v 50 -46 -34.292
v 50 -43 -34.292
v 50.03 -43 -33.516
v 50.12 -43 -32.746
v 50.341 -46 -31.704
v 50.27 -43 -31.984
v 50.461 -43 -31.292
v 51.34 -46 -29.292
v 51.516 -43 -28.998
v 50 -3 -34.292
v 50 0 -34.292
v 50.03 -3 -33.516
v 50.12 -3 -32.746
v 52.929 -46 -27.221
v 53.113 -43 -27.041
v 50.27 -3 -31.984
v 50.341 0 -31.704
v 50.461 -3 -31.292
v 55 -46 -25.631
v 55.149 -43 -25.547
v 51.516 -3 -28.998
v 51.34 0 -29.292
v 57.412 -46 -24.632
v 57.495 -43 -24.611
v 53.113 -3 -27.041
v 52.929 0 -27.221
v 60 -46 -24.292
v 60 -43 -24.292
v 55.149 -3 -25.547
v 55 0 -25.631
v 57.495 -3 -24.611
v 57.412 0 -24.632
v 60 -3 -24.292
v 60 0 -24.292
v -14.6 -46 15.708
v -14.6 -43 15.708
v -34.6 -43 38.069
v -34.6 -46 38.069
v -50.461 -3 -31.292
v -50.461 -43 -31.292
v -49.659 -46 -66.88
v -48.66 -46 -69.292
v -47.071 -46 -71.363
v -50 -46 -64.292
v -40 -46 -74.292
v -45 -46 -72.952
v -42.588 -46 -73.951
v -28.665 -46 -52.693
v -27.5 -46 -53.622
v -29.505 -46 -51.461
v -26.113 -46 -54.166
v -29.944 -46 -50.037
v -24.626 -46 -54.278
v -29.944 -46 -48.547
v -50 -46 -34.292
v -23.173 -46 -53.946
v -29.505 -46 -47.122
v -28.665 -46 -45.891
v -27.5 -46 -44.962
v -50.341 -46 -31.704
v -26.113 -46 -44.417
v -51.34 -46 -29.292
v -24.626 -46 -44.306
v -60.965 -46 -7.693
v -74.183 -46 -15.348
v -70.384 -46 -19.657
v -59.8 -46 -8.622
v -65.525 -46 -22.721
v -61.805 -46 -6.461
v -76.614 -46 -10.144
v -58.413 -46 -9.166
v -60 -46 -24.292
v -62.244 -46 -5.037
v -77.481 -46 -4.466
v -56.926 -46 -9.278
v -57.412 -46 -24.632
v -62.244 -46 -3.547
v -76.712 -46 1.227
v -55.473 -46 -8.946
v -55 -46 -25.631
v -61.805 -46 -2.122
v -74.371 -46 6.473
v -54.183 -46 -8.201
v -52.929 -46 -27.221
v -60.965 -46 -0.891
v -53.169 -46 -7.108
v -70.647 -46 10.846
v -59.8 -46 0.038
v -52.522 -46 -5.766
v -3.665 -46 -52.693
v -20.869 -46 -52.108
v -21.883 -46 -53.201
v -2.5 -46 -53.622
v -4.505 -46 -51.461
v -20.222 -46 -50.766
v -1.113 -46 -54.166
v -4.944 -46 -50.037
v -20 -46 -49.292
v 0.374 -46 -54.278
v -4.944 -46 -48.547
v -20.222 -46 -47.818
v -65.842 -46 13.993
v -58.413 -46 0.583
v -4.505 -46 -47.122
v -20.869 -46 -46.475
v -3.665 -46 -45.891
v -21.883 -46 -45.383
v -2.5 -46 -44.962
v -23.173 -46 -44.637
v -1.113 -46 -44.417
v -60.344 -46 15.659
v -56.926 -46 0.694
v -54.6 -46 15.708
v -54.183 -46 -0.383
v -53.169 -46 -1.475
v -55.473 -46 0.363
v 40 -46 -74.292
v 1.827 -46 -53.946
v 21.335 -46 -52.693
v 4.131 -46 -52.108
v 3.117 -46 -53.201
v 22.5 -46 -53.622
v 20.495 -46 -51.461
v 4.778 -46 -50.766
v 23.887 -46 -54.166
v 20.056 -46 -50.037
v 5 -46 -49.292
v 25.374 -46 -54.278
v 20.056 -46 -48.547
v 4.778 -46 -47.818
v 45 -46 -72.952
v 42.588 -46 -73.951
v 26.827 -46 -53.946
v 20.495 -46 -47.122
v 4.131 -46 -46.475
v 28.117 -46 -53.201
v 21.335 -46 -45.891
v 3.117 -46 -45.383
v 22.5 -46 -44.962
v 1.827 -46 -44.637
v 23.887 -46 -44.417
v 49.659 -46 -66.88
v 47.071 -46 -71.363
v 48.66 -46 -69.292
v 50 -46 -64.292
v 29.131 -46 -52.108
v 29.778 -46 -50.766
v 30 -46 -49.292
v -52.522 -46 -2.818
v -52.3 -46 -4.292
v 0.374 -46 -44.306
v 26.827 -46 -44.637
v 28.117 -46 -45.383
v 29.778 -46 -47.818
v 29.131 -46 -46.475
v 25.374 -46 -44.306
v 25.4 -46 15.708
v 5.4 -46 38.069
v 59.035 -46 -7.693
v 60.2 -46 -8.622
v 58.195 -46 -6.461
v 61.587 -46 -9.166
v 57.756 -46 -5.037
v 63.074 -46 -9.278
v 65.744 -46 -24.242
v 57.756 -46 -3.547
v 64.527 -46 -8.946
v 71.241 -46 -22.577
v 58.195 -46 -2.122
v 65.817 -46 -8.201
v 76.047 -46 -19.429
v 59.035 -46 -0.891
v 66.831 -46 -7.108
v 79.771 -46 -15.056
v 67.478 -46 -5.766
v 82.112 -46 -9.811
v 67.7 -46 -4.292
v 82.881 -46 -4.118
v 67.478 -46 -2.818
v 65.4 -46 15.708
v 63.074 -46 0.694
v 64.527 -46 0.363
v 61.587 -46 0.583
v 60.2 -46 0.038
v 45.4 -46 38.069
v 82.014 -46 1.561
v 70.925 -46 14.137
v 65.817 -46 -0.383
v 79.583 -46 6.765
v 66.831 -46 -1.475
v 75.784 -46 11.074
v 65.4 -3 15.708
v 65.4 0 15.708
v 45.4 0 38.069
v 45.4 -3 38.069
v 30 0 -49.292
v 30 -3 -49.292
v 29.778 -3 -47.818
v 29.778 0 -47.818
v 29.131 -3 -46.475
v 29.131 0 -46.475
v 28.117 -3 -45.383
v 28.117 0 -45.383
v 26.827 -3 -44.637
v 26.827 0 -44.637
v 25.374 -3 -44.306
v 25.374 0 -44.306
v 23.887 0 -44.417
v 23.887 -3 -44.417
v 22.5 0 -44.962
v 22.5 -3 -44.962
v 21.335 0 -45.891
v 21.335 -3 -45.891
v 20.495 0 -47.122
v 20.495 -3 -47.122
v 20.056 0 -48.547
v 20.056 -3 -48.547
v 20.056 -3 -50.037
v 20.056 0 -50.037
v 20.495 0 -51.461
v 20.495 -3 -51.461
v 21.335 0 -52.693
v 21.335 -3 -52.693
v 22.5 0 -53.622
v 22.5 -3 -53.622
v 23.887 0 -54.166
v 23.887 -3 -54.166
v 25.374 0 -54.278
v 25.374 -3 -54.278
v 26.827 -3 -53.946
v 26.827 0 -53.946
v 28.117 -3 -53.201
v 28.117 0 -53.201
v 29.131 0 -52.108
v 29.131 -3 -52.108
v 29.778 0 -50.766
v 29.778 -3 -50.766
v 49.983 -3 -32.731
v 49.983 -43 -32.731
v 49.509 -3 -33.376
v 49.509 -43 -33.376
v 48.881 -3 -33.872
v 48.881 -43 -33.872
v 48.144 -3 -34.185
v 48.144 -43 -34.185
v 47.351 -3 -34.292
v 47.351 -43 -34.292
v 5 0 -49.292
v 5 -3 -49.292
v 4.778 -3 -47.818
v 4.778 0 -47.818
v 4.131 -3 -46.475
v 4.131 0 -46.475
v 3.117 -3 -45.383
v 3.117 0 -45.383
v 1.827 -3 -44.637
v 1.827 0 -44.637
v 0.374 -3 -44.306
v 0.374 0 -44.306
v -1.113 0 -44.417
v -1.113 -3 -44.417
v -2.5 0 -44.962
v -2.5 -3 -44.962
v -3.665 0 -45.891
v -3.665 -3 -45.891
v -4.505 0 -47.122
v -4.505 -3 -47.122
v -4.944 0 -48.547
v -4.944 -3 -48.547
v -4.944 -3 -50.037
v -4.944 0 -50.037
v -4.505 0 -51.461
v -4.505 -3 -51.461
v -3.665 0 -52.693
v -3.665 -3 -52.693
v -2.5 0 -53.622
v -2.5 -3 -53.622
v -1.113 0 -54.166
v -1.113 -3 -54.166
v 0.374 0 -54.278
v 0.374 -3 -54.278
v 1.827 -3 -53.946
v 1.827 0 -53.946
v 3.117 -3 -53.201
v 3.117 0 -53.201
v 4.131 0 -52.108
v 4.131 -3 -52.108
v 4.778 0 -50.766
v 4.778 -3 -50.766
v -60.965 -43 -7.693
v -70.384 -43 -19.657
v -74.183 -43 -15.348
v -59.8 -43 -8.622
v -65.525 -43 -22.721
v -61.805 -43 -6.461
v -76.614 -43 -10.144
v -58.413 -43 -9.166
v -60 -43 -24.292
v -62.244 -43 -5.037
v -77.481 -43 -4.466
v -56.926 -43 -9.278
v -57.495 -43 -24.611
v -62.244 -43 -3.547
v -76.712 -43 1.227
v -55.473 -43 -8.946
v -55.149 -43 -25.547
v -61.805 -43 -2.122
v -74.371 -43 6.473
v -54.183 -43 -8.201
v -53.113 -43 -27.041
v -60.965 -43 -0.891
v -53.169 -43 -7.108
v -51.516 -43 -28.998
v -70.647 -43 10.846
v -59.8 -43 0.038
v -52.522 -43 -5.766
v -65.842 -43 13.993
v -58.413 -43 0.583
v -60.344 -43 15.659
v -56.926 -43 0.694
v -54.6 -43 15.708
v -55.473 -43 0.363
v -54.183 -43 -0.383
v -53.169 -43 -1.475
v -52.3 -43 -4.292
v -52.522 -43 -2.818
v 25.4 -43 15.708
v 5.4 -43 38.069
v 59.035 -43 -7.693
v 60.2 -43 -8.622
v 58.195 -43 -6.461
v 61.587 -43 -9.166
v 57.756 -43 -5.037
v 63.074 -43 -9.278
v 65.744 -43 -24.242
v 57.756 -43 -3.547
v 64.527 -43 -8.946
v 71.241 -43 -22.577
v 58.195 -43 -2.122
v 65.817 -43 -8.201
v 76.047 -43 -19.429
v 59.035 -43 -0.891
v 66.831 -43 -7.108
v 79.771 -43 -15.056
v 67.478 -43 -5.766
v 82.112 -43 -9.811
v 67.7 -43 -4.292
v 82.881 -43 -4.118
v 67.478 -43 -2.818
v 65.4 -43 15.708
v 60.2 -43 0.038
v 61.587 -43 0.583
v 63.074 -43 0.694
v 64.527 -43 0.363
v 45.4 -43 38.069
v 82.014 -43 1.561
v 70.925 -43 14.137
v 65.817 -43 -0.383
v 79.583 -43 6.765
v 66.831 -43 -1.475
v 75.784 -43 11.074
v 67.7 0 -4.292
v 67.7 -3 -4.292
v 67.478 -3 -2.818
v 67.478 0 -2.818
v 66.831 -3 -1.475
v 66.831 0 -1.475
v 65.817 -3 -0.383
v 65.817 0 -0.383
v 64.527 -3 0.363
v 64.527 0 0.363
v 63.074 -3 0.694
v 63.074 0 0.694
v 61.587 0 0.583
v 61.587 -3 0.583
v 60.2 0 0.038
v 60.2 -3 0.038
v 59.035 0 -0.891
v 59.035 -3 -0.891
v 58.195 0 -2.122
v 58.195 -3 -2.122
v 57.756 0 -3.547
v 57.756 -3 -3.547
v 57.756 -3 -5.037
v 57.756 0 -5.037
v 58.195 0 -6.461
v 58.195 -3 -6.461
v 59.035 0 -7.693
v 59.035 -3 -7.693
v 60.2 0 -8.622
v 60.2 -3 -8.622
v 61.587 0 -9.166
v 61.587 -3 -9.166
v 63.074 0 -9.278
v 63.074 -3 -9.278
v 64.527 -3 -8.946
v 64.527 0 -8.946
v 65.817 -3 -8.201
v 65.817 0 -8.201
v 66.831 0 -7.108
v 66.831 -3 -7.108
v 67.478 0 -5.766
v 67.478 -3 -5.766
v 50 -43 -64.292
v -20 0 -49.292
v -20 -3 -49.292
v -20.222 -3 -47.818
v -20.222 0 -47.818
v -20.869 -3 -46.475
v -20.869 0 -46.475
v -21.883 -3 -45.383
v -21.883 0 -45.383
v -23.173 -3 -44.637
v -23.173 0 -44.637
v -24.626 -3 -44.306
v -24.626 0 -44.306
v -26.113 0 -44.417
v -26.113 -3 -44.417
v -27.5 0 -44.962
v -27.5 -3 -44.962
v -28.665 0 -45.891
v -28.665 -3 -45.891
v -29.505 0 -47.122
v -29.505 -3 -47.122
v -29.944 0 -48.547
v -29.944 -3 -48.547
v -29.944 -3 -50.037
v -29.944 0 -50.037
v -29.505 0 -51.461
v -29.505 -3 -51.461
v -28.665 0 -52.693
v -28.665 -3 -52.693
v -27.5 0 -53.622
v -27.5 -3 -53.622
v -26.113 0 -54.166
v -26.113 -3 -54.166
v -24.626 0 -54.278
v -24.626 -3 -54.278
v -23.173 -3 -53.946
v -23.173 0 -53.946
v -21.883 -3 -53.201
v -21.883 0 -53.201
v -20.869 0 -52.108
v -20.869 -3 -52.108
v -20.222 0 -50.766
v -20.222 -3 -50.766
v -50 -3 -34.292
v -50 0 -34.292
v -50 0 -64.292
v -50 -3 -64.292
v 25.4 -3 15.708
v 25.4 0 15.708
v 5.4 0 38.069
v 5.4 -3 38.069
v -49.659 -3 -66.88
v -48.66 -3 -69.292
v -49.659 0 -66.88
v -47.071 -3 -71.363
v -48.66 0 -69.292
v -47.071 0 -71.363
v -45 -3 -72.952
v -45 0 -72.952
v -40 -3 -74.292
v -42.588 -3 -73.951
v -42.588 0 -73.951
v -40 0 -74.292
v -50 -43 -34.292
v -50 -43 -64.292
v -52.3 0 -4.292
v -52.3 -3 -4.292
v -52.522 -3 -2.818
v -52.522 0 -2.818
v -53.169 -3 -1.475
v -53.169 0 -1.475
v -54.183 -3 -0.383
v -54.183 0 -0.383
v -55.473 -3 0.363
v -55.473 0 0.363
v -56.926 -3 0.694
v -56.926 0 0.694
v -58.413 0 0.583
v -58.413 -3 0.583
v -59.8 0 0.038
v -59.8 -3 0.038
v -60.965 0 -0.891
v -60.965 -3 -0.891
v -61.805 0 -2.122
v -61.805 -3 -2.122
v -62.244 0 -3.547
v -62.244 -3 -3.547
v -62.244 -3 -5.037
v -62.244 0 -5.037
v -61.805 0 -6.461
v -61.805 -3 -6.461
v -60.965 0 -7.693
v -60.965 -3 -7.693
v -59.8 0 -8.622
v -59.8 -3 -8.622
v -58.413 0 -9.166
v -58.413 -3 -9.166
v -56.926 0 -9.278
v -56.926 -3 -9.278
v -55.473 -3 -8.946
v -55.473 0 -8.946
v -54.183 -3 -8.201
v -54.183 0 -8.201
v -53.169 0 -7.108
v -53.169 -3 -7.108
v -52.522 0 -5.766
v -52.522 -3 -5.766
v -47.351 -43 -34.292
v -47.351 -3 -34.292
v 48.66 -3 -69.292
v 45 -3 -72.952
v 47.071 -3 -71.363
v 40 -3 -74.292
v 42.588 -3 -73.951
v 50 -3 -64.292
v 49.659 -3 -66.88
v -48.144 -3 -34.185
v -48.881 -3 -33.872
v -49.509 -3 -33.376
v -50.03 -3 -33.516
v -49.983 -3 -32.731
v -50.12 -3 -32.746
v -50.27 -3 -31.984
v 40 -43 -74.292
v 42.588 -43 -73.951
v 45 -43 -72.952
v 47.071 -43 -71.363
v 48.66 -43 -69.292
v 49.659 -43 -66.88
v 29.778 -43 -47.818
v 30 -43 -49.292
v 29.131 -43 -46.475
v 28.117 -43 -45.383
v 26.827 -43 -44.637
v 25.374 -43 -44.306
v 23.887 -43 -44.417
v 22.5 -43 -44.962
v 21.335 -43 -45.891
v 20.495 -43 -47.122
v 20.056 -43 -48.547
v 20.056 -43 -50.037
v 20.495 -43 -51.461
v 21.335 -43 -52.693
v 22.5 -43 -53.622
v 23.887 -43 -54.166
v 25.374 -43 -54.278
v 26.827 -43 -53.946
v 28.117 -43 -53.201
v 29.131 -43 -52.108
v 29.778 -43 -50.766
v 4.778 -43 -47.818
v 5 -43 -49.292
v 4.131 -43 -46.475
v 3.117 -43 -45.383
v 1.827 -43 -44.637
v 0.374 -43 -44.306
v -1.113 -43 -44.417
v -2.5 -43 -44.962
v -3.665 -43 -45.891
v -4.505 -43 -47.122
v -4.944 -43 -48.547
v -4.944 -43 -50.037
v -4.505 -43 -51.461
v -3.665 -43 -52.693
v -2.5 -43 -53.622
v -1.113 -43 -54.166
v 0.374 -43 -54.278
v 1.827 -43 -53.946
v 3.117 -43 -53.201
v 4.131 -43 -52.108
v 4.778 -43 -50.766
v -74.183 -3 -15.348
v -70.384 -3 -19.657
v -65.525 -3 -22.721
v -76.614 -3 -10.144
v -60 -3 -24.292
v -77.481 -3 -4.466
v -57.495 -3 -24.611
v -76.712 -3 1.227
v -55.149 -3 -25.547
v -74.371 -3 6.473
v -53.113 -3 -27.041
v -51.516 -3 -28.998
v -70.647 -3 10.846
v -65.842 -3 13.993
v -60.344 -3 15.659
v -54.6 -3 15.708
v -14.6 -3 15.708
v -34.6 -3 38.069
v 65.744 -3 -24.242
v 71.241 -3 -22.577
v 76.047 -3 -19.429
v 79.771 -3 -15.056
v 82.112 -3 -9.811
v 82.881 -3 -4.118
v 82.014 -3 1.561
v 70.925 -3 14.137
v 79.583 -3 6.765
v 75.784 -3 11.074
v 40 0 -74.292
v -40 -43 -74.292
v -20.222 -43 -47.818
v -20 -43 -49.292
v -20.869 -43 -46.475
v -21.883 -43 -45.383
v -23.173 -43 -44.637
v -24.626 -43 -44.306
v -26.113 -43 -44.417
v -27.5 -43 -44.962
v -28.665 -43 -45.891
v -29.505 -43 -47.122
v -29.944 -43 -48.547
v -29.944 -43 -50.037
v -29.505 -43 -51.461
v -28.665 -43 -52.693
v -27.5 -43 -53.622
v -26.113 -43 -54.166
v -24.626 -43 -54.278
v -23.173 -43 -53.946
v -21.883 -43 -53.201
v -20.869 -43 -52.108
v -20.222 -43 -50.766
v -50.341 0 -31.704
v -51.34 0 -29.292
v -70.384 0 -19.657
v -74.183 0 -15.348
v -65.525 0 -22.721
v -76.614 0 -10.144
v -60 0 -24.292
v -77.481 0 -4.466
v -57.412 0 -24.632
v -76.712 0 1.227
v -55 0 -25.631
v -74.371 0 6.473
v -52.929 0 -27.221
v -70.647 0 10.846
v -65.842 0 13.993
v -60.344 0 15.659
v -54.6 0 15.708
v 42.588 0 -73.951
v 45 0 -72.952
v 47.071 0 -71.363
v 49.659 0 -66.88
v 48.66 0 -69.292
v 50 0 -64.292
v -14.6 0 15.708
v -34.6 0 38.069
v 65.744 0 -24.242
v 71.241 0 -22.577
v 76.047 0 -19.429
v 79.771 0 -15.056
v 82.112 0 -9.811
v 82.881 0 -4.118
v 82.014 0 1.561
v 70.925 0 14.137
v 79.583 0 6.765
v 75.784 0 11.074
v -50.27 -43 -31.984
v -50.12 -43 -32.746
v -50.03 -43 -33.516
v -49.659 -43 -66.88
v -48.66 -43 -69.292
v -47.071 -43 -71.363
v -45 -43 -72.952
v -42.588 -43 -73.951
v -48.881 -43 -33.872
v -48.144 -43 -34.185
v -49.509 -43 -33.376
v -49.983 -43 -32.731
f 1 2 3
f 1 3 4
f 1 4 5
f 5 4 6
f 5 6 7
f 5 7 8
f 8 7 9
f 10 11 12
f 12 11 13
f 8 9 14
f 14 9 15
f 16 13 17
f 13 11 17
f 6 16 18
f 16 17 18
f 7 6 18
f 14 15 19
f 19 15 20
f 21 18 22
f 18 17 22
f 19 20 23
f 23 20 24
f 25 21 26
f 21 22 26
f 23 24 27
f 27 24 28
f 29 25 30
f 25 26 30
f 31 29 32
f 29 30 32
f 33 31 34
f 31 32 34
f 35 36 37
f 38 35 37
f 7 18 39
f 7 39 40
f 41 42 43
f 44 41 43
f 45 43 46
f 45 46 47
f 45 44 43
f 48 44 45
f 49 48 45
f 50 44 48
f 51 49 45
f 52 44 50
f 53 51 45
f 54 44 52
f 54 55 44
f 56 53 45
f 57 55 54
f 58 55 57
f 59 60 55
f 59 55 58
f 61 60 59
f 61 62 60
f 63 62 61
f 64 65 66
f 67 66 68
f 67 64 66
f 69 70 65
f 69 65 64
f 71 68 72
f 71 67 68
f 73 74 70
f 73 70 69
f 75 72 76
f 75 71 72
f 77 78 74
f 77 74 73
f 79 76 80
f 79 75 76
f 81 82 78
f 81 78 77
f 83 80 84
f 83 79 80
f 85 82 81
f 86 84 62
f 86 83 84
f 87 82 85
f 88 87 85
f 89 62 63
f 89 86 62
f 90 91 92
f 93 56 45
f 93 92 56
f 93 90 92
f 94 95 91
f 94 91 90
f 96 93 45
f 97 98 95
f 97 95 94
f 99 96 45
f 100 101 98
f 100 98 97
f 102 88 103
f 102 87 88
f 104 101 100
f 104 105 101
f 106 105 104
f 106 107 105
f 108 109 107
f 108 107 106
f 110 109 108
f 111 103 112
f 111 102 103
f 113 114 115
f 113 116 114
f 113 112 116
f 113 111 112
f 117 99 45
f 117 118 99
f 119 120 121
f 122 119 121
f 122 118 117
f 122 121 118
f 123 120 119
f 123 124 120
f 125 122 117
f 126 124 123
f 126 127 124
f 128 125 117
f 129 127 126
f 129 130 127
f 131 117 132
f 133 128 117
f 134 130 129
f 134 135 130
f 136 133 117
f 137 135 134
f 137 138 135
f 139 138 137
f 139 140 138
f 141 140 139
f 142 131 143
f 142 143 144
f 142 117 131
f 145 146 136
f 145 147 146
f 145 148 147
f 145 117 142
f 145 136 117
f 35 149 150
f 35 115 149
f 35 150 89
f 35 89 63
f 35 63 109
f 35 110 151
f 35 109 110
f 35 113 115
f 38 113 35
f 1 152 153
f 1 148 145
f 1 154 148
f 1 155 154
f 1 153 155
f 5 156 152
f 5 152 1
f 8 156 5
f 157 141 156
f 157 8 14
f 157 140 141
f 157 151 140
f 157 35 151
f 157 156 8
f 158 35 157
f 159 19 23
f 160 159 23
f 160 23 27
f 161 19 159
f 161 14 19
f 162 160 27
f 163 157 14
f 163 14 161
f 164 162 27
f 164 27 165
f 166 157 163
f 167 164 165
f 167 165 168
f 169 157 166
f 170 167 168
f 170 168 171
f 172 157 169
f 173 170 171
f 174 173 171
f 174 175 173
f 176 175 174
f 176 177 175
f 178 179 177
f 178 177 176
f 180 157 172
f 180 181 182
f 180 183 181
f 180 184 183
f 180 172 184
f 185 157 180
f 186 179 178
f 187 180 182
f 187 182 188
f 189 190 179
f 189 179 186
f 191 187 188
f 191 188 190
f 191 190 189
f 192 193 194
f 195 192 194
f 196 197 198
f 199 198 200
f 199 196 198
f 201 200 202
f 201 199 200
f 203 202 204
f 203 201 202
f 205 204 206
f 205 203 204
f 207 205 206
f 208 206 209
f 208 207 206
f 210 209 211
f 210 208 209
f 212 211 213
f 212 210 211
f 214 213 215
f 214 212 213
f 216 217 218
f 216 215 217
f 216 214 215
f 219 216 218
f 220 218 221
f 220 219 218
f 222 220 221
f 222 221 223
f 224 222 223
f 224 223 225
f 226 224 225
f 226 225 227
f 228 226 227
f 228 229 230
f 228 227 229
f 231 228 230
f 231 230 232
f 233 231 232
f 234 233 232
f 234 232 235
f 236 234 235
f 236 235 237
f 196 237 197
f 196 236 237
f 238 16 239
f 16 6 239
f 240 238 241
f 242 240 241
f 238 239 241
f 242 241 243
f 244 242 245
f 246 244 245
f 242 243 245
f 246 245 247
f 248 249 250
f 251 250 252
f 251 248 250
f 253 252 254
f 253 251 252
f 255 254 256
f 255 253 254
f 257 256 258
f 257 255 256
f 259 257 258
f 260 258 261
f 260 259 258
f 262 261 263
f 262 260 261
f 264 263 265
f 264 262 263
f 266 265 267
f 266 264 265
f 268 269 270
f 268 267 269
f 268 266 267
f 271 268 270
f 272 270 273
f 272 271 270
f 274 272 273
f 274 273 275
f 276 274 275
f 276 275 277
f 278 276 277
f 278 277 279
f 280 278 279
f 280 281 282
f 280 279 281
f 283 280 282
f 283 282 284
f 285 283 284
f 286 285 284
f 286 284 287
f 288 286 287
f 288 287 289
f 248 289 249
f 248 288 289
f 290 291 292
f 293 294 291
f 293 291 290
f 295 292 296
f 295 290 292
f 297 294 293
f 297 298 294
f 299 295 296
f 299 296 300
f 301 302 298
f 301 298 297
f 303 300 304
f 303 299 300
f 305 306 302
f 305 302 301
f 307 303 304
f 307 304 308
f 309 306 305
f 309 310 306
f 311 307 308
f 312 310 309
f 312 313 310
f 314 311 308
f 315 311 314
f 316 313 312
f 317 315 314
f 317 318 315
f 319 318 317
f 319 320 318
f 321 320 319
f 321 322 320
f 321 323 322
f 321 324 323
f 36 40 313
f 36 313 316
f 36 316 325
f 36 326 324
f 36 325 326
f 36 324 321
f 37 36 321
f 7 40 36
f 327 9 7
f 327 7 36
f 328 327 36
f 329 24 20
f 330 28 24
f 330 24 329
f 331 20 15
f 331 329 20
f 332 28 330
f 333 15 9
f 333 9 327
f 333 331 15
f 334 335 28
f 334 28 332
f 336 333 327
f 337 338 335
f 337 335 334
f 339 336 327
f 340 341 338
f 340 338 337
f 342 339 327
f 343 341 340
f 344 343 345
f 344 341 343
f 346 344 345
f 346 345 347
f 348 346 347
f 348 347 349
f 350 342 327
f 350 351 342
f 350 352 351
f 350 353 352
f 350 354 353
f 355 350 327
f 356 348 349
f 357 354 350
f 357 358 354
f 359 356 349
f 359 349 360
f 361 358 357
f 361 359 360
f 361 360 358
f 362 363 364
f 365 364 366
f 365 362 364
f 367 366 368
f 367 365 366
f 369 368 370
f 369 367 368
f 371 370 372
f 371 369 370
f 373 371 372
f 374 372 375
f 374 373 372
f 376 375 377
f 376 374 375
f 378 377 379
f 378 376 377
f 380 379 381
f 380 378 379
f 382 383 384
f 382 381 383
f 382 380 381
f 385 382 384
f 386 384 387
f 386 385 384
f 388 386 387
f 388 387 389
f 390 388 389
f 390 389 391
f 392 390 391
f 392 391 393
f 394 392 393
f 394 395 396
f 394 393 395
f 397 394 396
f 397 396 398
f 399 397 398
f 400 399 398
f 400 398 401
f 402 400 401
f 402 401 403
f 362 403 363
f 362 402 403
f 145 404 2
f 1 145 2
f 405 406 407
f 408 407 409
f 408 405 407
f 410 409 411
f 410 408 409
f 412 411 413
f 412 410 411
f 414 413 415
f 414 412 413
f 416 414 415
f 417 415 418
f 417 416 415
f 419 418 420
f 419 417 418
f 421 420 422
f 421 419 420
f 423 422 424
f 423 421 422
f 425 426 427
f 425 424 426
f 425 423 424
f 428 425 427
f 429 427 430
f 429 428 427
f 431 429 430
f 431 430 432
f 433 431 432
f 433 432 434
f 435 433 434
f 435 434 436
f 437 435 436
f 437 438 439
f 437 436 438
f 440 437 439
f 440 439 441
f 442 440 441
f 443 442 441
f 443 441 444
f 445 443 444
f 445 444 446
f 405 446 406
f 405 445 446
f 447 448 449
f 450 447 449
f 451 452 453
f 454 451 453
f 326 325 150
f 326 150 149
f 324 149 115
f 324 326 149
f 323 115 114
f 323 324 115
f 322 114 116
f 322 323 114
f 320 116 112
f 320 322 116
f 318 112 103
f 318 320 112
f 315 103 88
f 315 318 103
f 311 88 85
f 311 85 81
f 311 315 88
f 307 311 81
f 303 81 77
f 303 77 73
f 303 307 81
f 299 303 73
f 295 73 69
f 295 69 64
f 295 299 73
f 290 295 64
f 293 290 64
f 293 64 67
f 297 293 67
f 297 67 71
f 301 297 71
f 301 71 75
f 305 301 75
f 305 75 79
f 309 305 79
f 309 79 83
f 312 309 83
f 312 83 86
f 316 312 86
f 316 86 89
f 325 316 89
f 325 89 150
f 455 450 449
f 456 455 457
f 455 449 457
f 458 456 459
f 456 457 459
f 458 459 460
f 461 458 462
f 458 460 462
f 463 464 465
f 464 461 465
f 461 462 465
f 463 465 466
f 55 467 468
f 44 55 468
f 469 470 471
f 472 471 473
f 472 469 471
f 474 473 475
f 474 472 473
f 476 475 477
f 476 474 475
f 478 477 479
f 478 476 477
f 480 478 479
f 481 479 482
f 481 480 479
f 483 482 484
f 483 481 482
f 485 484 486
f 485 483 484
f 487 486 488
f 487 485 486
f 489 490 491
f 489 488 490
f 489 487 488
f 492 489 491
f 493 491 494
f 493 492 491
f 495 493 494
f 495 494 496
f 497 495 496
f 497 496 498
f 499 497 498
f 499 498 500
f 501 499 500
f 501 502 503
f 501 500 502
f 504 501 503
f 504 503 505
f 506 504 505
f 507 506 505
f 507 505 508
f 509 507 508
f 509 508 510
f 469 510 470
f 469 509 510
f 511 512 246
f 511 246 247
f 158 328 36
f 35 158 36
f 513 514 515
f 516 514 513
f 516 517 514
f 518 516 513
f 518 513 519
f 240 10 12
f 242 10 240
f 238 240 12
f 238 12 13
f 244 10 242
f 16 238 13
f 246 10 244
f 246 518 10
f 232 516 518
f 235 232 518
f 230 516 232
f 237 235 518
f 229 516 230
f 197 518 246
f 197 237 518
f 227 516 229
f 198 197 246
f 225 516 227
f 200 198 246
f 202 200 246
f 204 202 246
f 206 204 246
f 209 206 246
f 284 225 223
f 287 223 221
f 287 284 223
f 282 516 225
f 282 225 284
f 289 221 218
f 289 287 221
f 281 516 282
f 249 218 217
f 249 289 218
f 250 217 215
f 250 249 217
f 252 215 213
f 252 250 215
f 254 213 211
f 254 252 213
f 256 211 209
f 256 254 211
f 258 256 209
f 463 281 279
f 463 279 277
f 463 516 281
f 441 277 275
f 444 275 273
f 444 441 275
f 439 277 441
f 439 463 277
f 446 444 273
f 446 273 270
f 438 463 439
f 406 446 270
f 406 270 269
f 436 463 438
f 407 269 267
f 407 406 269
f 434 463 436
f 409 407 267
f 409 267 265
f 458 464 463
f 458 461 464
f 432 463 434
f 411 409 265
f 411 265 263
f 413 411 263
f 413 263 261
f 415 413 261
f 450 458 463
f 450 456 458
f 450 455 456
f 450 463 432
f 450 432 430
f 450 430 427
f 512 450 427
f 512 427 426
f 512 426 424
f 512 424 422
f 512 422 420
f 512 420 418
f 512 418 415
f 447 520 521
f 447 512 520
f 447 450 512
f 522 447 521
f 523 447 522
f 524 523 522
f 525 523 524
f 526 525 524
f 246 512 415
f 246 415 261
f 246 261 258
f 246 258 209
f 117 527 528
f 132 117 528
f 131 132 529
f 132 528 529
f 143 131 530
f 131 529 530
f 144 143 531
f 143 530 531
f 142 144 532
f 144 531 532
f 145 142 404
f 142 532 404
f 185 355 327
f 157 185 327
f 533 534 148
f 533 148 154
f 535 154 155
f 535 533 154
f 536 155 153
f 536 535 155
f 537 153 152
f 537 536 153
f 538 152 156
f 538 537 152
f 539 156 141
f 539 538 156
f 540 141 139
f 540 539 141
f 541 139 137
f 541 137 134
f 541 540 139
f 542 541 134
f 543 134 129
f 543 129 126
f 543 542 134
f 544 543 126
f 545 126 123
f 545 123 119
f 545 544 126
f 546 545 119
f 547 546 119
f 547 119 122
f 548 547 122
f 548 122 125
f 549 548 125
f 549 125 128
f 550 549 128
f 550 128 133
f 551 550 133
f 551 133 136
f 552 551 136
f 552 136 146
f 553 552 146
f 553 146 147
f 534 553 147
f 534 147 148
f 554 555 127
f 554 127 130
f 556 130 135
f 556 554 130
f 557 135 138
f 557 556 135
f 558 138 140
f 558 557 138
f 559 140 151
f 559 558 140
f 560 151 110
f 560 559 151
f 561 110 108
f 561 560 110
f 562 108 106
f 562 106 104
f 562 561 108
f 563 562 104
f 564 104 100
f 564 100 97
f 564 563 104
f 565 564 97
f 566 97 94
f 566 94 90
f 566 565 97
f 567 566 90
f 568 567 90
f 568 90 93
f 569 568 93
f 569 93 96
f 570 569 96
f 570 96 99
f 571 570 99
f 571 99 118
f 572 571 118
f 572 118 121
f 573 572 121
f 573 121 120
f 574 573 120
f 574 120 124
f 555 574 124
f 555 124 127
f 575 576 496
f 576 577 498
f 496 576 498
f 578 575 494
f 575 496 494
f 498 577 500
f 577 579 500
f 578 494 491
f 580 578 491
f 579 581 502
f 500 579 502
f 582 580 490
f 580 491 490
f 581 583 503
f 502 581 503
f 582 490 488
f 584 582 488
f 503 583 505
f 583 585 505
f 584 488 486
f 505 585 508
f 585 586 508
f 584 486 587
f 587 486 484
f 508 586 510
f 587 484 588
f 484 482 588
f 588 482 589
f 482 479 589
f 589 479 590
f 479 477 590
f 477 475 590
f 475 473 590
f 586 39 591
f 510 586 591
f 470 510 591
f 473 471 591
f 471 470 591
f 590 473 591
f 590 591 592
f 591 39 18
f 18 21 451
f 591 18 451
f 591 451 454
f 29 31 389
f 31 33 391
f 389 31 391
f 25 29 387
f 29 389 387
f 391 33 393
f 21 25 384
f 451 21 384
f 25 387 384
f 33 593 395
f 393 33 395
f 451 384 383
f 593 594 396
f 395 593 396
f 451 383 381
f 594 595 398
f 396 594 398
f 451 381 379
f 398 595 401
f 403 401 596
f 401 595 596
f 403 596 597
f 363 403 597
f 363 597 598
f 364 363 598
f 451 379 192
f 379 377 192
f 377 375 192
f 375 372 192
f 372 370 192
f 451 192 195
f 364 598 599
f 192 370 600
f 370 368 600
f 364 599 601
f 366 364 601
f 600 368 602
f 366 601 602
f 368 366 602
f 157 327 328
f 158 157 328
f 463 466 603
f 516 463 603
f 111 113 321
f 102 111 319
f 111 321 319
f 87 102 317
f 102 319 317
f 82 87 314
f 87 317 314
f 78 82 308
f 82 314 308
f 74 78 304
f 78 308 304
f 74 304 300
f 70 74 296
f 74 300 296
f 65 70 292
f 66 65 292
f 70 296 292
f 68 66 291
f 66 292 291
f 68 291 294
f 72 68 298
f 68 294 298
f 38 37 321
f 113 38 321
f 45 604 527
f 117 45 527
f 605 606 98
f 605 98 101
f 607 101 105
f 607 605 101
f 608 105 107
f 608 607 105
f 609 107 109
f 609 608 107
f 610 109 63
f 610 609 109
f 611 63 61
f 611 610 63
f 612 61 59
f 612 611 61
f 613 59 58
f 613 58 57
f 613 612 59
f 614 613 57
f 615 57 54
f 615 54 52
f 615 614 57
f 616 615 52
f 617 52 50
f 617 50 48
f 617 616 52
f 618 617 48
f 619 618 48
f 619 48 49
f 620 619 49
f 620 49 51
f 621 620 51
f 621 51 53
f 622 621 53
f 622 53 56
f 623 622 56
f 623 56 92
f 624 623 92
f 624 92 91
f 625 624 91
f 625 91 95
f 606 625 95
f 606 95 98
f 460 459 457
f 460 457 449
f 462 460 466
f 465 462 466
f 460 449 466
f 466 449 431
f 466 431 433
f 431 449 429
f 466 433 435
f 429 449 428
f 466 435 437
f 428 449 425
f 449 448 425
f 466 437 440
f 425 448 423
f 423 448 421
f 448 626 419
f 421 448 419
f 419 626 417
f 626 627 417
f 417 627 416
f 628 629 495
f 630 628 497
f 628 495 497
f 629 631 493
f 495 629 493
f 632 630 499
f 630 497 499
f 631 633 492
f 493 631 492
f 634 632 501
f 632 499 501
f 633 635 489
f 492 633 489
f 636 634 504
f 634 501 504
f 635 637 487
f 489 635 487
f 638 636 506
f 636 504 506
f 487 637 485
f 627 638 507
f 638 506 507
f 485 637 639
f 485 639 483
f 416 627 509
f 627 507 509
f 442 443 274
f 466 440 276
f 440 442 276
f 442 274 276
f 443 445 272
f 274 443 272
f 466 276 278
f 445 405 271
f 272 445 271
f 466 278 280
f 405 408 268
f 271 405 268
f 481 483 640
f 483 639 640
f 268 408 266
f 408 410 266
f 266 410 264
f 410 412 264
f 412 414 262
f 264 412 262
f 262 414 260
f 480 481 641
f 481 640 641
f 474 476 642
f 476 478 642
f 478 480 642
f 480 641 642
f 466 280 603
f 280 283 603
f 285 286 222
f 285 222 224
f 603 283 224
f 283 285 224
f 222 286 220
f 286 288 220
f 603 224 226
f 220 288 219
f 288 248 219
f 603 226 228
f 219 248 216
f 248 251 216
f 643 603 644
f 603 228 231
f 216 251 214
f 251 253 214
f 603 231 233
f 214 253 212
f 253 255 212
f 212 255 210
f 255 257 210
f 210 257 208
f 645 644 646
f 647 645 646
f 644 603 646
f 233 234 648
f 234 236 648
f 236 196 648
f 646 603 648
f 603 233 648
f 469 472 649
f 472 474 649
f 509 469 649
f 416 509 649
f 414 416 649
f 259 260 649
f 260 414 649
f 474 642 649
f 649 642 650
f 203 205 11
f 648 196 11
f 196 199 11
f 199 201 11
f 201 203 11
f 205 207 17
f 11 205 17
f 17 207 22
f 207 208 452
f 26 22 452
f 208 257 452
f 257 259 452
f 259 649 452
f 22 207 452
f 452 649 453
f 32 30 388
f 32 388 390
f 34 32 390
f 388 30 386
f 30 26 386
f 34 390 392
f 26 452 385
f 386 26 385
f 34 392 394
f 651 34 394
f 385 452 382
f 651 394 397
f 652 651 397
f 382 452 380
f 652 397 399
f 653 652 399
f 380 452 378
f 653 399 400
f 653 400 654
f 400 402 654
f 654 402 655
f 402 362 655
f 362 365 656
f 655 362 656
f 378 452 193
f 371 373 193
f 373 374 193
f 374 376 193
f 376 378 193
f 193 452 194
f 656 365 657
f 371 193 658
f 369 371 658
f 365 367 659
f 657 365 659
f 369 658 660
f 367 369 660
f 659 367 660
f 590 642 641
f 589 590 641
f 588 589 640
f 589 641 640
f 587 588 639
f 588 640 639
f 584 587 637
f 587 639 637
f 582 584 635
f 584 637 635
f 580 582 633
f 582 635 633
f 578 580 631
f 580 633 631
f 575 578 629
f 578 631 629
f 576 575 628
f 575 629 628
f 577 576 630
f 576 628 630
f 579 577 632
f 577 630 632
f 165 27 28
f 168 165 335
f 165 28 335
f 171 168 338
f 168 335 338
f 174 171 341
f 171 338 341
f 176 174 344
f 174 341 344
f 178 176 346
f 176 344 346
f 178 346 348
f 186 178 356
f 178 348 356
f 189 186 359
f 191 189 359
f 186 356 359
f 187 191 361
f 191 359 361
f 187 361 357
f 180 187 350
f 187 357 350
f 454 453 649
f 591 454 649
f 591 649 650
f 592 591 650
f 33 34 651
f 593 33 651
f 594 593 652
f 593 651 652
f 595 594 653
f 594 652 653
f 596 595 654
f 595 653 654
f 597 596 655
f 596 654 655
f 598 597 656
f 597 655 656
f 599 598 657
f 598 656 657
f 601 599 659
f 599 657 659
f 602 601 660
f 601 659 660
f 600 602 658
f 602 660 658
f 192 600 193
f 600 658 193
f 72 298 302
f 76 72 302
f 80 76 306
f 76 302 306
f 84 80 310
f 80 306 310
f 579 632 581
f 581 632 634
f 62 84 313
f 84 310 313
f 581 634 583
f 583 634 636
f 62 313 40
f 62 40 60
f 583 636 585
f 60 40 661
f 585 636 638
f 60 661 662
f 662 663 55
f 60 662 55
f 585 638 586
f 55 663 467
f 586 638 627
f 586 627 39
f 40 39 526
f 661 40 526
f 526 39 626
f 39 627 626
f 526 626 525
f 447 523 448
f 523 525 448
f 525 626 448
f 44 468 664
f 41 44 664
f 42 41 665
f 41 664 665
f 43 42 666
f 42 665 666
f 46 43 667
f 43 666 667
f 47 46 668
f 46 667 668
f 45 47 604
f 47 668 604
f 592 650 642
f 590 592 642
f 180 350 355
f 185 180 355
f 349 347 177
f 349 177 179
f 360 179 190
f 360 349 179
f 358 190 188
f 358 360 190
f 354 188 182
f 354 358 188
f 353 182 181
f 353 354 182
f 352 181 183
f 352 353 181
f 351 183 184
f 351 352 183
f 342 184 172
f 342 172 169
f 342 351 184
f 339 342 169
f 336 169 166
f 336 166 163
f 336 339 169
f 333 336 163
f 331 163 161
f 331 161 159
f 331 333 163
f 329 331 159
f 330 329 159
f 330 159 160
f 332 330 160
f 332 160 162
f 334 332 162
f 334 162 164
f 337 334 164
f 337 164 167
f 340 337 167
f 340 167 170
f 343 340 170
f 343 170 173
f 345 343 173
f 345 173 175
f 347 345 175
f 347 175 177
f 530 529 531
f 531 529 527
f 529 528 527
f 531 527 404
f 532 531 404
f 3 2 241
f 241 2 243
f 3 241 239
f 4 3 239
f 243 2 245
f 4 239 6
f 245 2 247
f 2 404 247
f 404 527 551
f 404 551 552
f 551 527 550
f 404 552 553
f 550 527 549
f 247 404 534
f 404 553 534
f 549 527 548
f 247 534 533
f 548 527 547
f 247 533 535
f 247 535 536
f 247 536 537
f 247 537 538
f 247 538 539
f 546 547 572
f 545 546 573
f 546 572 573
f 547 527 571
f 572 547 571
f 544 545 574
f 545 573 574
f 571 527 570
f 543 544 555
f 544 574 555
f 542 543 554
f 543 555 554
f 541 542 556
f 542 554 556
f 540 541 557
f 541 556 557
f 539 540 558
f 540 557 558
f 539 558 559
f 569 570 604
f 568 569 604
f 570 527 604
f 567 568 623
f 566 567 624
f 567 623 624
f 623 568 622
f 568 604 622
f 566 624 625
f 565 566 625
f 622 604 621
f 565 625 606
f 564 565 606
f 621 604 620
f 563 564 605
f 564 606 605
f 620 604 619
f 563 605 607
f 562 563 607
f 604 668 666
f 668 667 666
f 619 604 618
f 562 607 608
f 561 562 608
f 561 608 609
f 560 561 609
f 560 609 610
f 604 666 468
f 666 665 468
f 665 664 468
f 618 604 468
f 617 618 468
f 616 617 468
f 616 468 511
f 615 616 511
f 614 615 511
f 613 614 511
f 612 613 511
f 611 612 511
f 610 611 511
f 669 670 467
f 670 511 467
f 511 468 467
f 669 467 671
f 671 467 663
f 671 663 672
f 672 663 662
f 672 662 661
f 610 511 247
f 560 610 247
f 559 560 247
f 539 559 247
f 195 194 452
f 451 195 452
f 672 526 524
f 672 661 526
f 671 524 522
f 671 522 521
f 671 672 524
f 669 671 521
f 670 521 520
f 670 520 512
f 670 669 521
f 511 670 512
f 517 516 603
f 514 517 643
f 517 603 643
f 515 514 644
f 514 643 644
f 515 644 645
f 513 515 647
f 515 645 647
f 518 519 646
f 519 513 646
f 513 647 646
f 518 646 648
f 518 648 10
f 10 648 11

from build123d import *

# Parameters (mm, degrees)
F0_R     = 5
F1_DEPTH = 46
F2_W     = 40
F2_H     = 62.4393149427
F2_H_2   = 108.6921231934
F3_DEPTH = 132.8823650188
F4_DEPTH = 27.4824745393
F5_R     = 3


with BuildPart() as f1:
    # F0 (on Front) → F1 (new body)
    with BuildSketch(Plane.XZ):
        with BuildLine():
            Line((-34.6001095204, 38.0689354645), (-54.6001095204, 15.7082556895))
            ThreePointArc((-54.6001095204, 15.7082556895), (-77.3000547602, -1.5917990707), (-60, -24.2917443105))
            ThreePointArc((-60, -24.2917443105), (-52.9289321881, -27.2206764986), (-50, -34.2917443105))
            Line((-50, -34.2917443105), (-50, -64.2917443105))
            ThreePointArc((-50, -64.2917443105), (-47.0710678119, -71.3628121224), (-40, -74.2917443105))
            Line((-40, -74.2917443105), (40, -74.2917443105))
            ThreePointArc((40, -74.2917443105), (47.0710678119, -71.3628121224), (50, -64.2917443105))
            Line((50, -64.2917443105), (50, -34.2917443105))
            ThreePointArc((50, -34.2917443105), (52.9289321881, -27.2206764986), (60, -24.2917443105))
            ThreePointArc((60, -24.2917443105), (82.6999452398, -6.9916895503), (65.3998904796, 15.7082556895))
            Line((65.3998904796, 15.7082556895), (45.3998904796, 38.0689354645))
            Line((45.3998904796, 38.0689354645), (25.3998904796, 15.7082556895))
            Line((25.3998904796, 15.7082556895), (5.3998904796, 38.0689354645))
            Line((5.3998904796, 38.0689354645), (-14.6001095204, 15.7082556895))
            Line((-14.6001095204, 15.7082556895), (-34.6001095204, 38.0689354645))
        make_face()
        with Locations((-25, -49.2917443105)):
            Circle(F0_R, mode=Mode.SUBTRACT)
        with Locations((0, -49.2917443105)):
            Circle(F0_R, mode=Mode.SUBTRACT)
        with Locations((25, -49.2917443105)):
            Circle(F0_R, mode=Mode.SUBTRACT)
        with Locations((-57.3000547602, -4.2917443105)):
            Circle(F0_R, mode=Mode.SUBTRACT)
        with Locations((62.6999452398, -4.2917443105)):
            Circle(F0_R, mode=Mode.SUBTRACT)
    extrude(amount=F1_DEPTH)

    # F2 (on face) → F3 (cut, through all)
    with BuildSketch(Plane(origin=(-50, 0, 0), x_dir=(0, -1, 0), z_dir=(-1, 0, 0))):
        with Locations((23, -65.5114017819)):
            Rectangle(F2_W, F2_H)
        with Locations((23, 23.0543172862)):
            Rectangle(F2_W, F2_H_2)
    extrude(amount=-F3_DEPTH, mode=Mode.SUBTRACT)

    # F2 (on face) → F4 (cut, through all)
    with BuildSketch(Plane(origin=(-50, 0, 0), x_dir=(0, -1, 0), z_dir=(-1, 0, 0))):
        with Locations((23, -65.5114017819)):
            Rectangle(F2_W, F2_H)
        with Locations((23, 23.0543172862)):
            Rectangle(F2_W, F2_H_2)
    extrude(amount=F4_DEPTH, mode=Mode.SUBTRACT)

    # F5
    f5_edges = [f1.edges().sort_by_distance(p)[0] for p in [
        (-50, -1.5, -34.291744),
        (-50, -23, -34.291744),
        (-50, -44.5, -34.291744),
        (50, -1.5, -34.291744),
        (50, -44.5, -34.291744),
        (50, -23, -34.291744),
    ]]
    fillet(f5_edges, radius=F5_R)


solid = f1.part
